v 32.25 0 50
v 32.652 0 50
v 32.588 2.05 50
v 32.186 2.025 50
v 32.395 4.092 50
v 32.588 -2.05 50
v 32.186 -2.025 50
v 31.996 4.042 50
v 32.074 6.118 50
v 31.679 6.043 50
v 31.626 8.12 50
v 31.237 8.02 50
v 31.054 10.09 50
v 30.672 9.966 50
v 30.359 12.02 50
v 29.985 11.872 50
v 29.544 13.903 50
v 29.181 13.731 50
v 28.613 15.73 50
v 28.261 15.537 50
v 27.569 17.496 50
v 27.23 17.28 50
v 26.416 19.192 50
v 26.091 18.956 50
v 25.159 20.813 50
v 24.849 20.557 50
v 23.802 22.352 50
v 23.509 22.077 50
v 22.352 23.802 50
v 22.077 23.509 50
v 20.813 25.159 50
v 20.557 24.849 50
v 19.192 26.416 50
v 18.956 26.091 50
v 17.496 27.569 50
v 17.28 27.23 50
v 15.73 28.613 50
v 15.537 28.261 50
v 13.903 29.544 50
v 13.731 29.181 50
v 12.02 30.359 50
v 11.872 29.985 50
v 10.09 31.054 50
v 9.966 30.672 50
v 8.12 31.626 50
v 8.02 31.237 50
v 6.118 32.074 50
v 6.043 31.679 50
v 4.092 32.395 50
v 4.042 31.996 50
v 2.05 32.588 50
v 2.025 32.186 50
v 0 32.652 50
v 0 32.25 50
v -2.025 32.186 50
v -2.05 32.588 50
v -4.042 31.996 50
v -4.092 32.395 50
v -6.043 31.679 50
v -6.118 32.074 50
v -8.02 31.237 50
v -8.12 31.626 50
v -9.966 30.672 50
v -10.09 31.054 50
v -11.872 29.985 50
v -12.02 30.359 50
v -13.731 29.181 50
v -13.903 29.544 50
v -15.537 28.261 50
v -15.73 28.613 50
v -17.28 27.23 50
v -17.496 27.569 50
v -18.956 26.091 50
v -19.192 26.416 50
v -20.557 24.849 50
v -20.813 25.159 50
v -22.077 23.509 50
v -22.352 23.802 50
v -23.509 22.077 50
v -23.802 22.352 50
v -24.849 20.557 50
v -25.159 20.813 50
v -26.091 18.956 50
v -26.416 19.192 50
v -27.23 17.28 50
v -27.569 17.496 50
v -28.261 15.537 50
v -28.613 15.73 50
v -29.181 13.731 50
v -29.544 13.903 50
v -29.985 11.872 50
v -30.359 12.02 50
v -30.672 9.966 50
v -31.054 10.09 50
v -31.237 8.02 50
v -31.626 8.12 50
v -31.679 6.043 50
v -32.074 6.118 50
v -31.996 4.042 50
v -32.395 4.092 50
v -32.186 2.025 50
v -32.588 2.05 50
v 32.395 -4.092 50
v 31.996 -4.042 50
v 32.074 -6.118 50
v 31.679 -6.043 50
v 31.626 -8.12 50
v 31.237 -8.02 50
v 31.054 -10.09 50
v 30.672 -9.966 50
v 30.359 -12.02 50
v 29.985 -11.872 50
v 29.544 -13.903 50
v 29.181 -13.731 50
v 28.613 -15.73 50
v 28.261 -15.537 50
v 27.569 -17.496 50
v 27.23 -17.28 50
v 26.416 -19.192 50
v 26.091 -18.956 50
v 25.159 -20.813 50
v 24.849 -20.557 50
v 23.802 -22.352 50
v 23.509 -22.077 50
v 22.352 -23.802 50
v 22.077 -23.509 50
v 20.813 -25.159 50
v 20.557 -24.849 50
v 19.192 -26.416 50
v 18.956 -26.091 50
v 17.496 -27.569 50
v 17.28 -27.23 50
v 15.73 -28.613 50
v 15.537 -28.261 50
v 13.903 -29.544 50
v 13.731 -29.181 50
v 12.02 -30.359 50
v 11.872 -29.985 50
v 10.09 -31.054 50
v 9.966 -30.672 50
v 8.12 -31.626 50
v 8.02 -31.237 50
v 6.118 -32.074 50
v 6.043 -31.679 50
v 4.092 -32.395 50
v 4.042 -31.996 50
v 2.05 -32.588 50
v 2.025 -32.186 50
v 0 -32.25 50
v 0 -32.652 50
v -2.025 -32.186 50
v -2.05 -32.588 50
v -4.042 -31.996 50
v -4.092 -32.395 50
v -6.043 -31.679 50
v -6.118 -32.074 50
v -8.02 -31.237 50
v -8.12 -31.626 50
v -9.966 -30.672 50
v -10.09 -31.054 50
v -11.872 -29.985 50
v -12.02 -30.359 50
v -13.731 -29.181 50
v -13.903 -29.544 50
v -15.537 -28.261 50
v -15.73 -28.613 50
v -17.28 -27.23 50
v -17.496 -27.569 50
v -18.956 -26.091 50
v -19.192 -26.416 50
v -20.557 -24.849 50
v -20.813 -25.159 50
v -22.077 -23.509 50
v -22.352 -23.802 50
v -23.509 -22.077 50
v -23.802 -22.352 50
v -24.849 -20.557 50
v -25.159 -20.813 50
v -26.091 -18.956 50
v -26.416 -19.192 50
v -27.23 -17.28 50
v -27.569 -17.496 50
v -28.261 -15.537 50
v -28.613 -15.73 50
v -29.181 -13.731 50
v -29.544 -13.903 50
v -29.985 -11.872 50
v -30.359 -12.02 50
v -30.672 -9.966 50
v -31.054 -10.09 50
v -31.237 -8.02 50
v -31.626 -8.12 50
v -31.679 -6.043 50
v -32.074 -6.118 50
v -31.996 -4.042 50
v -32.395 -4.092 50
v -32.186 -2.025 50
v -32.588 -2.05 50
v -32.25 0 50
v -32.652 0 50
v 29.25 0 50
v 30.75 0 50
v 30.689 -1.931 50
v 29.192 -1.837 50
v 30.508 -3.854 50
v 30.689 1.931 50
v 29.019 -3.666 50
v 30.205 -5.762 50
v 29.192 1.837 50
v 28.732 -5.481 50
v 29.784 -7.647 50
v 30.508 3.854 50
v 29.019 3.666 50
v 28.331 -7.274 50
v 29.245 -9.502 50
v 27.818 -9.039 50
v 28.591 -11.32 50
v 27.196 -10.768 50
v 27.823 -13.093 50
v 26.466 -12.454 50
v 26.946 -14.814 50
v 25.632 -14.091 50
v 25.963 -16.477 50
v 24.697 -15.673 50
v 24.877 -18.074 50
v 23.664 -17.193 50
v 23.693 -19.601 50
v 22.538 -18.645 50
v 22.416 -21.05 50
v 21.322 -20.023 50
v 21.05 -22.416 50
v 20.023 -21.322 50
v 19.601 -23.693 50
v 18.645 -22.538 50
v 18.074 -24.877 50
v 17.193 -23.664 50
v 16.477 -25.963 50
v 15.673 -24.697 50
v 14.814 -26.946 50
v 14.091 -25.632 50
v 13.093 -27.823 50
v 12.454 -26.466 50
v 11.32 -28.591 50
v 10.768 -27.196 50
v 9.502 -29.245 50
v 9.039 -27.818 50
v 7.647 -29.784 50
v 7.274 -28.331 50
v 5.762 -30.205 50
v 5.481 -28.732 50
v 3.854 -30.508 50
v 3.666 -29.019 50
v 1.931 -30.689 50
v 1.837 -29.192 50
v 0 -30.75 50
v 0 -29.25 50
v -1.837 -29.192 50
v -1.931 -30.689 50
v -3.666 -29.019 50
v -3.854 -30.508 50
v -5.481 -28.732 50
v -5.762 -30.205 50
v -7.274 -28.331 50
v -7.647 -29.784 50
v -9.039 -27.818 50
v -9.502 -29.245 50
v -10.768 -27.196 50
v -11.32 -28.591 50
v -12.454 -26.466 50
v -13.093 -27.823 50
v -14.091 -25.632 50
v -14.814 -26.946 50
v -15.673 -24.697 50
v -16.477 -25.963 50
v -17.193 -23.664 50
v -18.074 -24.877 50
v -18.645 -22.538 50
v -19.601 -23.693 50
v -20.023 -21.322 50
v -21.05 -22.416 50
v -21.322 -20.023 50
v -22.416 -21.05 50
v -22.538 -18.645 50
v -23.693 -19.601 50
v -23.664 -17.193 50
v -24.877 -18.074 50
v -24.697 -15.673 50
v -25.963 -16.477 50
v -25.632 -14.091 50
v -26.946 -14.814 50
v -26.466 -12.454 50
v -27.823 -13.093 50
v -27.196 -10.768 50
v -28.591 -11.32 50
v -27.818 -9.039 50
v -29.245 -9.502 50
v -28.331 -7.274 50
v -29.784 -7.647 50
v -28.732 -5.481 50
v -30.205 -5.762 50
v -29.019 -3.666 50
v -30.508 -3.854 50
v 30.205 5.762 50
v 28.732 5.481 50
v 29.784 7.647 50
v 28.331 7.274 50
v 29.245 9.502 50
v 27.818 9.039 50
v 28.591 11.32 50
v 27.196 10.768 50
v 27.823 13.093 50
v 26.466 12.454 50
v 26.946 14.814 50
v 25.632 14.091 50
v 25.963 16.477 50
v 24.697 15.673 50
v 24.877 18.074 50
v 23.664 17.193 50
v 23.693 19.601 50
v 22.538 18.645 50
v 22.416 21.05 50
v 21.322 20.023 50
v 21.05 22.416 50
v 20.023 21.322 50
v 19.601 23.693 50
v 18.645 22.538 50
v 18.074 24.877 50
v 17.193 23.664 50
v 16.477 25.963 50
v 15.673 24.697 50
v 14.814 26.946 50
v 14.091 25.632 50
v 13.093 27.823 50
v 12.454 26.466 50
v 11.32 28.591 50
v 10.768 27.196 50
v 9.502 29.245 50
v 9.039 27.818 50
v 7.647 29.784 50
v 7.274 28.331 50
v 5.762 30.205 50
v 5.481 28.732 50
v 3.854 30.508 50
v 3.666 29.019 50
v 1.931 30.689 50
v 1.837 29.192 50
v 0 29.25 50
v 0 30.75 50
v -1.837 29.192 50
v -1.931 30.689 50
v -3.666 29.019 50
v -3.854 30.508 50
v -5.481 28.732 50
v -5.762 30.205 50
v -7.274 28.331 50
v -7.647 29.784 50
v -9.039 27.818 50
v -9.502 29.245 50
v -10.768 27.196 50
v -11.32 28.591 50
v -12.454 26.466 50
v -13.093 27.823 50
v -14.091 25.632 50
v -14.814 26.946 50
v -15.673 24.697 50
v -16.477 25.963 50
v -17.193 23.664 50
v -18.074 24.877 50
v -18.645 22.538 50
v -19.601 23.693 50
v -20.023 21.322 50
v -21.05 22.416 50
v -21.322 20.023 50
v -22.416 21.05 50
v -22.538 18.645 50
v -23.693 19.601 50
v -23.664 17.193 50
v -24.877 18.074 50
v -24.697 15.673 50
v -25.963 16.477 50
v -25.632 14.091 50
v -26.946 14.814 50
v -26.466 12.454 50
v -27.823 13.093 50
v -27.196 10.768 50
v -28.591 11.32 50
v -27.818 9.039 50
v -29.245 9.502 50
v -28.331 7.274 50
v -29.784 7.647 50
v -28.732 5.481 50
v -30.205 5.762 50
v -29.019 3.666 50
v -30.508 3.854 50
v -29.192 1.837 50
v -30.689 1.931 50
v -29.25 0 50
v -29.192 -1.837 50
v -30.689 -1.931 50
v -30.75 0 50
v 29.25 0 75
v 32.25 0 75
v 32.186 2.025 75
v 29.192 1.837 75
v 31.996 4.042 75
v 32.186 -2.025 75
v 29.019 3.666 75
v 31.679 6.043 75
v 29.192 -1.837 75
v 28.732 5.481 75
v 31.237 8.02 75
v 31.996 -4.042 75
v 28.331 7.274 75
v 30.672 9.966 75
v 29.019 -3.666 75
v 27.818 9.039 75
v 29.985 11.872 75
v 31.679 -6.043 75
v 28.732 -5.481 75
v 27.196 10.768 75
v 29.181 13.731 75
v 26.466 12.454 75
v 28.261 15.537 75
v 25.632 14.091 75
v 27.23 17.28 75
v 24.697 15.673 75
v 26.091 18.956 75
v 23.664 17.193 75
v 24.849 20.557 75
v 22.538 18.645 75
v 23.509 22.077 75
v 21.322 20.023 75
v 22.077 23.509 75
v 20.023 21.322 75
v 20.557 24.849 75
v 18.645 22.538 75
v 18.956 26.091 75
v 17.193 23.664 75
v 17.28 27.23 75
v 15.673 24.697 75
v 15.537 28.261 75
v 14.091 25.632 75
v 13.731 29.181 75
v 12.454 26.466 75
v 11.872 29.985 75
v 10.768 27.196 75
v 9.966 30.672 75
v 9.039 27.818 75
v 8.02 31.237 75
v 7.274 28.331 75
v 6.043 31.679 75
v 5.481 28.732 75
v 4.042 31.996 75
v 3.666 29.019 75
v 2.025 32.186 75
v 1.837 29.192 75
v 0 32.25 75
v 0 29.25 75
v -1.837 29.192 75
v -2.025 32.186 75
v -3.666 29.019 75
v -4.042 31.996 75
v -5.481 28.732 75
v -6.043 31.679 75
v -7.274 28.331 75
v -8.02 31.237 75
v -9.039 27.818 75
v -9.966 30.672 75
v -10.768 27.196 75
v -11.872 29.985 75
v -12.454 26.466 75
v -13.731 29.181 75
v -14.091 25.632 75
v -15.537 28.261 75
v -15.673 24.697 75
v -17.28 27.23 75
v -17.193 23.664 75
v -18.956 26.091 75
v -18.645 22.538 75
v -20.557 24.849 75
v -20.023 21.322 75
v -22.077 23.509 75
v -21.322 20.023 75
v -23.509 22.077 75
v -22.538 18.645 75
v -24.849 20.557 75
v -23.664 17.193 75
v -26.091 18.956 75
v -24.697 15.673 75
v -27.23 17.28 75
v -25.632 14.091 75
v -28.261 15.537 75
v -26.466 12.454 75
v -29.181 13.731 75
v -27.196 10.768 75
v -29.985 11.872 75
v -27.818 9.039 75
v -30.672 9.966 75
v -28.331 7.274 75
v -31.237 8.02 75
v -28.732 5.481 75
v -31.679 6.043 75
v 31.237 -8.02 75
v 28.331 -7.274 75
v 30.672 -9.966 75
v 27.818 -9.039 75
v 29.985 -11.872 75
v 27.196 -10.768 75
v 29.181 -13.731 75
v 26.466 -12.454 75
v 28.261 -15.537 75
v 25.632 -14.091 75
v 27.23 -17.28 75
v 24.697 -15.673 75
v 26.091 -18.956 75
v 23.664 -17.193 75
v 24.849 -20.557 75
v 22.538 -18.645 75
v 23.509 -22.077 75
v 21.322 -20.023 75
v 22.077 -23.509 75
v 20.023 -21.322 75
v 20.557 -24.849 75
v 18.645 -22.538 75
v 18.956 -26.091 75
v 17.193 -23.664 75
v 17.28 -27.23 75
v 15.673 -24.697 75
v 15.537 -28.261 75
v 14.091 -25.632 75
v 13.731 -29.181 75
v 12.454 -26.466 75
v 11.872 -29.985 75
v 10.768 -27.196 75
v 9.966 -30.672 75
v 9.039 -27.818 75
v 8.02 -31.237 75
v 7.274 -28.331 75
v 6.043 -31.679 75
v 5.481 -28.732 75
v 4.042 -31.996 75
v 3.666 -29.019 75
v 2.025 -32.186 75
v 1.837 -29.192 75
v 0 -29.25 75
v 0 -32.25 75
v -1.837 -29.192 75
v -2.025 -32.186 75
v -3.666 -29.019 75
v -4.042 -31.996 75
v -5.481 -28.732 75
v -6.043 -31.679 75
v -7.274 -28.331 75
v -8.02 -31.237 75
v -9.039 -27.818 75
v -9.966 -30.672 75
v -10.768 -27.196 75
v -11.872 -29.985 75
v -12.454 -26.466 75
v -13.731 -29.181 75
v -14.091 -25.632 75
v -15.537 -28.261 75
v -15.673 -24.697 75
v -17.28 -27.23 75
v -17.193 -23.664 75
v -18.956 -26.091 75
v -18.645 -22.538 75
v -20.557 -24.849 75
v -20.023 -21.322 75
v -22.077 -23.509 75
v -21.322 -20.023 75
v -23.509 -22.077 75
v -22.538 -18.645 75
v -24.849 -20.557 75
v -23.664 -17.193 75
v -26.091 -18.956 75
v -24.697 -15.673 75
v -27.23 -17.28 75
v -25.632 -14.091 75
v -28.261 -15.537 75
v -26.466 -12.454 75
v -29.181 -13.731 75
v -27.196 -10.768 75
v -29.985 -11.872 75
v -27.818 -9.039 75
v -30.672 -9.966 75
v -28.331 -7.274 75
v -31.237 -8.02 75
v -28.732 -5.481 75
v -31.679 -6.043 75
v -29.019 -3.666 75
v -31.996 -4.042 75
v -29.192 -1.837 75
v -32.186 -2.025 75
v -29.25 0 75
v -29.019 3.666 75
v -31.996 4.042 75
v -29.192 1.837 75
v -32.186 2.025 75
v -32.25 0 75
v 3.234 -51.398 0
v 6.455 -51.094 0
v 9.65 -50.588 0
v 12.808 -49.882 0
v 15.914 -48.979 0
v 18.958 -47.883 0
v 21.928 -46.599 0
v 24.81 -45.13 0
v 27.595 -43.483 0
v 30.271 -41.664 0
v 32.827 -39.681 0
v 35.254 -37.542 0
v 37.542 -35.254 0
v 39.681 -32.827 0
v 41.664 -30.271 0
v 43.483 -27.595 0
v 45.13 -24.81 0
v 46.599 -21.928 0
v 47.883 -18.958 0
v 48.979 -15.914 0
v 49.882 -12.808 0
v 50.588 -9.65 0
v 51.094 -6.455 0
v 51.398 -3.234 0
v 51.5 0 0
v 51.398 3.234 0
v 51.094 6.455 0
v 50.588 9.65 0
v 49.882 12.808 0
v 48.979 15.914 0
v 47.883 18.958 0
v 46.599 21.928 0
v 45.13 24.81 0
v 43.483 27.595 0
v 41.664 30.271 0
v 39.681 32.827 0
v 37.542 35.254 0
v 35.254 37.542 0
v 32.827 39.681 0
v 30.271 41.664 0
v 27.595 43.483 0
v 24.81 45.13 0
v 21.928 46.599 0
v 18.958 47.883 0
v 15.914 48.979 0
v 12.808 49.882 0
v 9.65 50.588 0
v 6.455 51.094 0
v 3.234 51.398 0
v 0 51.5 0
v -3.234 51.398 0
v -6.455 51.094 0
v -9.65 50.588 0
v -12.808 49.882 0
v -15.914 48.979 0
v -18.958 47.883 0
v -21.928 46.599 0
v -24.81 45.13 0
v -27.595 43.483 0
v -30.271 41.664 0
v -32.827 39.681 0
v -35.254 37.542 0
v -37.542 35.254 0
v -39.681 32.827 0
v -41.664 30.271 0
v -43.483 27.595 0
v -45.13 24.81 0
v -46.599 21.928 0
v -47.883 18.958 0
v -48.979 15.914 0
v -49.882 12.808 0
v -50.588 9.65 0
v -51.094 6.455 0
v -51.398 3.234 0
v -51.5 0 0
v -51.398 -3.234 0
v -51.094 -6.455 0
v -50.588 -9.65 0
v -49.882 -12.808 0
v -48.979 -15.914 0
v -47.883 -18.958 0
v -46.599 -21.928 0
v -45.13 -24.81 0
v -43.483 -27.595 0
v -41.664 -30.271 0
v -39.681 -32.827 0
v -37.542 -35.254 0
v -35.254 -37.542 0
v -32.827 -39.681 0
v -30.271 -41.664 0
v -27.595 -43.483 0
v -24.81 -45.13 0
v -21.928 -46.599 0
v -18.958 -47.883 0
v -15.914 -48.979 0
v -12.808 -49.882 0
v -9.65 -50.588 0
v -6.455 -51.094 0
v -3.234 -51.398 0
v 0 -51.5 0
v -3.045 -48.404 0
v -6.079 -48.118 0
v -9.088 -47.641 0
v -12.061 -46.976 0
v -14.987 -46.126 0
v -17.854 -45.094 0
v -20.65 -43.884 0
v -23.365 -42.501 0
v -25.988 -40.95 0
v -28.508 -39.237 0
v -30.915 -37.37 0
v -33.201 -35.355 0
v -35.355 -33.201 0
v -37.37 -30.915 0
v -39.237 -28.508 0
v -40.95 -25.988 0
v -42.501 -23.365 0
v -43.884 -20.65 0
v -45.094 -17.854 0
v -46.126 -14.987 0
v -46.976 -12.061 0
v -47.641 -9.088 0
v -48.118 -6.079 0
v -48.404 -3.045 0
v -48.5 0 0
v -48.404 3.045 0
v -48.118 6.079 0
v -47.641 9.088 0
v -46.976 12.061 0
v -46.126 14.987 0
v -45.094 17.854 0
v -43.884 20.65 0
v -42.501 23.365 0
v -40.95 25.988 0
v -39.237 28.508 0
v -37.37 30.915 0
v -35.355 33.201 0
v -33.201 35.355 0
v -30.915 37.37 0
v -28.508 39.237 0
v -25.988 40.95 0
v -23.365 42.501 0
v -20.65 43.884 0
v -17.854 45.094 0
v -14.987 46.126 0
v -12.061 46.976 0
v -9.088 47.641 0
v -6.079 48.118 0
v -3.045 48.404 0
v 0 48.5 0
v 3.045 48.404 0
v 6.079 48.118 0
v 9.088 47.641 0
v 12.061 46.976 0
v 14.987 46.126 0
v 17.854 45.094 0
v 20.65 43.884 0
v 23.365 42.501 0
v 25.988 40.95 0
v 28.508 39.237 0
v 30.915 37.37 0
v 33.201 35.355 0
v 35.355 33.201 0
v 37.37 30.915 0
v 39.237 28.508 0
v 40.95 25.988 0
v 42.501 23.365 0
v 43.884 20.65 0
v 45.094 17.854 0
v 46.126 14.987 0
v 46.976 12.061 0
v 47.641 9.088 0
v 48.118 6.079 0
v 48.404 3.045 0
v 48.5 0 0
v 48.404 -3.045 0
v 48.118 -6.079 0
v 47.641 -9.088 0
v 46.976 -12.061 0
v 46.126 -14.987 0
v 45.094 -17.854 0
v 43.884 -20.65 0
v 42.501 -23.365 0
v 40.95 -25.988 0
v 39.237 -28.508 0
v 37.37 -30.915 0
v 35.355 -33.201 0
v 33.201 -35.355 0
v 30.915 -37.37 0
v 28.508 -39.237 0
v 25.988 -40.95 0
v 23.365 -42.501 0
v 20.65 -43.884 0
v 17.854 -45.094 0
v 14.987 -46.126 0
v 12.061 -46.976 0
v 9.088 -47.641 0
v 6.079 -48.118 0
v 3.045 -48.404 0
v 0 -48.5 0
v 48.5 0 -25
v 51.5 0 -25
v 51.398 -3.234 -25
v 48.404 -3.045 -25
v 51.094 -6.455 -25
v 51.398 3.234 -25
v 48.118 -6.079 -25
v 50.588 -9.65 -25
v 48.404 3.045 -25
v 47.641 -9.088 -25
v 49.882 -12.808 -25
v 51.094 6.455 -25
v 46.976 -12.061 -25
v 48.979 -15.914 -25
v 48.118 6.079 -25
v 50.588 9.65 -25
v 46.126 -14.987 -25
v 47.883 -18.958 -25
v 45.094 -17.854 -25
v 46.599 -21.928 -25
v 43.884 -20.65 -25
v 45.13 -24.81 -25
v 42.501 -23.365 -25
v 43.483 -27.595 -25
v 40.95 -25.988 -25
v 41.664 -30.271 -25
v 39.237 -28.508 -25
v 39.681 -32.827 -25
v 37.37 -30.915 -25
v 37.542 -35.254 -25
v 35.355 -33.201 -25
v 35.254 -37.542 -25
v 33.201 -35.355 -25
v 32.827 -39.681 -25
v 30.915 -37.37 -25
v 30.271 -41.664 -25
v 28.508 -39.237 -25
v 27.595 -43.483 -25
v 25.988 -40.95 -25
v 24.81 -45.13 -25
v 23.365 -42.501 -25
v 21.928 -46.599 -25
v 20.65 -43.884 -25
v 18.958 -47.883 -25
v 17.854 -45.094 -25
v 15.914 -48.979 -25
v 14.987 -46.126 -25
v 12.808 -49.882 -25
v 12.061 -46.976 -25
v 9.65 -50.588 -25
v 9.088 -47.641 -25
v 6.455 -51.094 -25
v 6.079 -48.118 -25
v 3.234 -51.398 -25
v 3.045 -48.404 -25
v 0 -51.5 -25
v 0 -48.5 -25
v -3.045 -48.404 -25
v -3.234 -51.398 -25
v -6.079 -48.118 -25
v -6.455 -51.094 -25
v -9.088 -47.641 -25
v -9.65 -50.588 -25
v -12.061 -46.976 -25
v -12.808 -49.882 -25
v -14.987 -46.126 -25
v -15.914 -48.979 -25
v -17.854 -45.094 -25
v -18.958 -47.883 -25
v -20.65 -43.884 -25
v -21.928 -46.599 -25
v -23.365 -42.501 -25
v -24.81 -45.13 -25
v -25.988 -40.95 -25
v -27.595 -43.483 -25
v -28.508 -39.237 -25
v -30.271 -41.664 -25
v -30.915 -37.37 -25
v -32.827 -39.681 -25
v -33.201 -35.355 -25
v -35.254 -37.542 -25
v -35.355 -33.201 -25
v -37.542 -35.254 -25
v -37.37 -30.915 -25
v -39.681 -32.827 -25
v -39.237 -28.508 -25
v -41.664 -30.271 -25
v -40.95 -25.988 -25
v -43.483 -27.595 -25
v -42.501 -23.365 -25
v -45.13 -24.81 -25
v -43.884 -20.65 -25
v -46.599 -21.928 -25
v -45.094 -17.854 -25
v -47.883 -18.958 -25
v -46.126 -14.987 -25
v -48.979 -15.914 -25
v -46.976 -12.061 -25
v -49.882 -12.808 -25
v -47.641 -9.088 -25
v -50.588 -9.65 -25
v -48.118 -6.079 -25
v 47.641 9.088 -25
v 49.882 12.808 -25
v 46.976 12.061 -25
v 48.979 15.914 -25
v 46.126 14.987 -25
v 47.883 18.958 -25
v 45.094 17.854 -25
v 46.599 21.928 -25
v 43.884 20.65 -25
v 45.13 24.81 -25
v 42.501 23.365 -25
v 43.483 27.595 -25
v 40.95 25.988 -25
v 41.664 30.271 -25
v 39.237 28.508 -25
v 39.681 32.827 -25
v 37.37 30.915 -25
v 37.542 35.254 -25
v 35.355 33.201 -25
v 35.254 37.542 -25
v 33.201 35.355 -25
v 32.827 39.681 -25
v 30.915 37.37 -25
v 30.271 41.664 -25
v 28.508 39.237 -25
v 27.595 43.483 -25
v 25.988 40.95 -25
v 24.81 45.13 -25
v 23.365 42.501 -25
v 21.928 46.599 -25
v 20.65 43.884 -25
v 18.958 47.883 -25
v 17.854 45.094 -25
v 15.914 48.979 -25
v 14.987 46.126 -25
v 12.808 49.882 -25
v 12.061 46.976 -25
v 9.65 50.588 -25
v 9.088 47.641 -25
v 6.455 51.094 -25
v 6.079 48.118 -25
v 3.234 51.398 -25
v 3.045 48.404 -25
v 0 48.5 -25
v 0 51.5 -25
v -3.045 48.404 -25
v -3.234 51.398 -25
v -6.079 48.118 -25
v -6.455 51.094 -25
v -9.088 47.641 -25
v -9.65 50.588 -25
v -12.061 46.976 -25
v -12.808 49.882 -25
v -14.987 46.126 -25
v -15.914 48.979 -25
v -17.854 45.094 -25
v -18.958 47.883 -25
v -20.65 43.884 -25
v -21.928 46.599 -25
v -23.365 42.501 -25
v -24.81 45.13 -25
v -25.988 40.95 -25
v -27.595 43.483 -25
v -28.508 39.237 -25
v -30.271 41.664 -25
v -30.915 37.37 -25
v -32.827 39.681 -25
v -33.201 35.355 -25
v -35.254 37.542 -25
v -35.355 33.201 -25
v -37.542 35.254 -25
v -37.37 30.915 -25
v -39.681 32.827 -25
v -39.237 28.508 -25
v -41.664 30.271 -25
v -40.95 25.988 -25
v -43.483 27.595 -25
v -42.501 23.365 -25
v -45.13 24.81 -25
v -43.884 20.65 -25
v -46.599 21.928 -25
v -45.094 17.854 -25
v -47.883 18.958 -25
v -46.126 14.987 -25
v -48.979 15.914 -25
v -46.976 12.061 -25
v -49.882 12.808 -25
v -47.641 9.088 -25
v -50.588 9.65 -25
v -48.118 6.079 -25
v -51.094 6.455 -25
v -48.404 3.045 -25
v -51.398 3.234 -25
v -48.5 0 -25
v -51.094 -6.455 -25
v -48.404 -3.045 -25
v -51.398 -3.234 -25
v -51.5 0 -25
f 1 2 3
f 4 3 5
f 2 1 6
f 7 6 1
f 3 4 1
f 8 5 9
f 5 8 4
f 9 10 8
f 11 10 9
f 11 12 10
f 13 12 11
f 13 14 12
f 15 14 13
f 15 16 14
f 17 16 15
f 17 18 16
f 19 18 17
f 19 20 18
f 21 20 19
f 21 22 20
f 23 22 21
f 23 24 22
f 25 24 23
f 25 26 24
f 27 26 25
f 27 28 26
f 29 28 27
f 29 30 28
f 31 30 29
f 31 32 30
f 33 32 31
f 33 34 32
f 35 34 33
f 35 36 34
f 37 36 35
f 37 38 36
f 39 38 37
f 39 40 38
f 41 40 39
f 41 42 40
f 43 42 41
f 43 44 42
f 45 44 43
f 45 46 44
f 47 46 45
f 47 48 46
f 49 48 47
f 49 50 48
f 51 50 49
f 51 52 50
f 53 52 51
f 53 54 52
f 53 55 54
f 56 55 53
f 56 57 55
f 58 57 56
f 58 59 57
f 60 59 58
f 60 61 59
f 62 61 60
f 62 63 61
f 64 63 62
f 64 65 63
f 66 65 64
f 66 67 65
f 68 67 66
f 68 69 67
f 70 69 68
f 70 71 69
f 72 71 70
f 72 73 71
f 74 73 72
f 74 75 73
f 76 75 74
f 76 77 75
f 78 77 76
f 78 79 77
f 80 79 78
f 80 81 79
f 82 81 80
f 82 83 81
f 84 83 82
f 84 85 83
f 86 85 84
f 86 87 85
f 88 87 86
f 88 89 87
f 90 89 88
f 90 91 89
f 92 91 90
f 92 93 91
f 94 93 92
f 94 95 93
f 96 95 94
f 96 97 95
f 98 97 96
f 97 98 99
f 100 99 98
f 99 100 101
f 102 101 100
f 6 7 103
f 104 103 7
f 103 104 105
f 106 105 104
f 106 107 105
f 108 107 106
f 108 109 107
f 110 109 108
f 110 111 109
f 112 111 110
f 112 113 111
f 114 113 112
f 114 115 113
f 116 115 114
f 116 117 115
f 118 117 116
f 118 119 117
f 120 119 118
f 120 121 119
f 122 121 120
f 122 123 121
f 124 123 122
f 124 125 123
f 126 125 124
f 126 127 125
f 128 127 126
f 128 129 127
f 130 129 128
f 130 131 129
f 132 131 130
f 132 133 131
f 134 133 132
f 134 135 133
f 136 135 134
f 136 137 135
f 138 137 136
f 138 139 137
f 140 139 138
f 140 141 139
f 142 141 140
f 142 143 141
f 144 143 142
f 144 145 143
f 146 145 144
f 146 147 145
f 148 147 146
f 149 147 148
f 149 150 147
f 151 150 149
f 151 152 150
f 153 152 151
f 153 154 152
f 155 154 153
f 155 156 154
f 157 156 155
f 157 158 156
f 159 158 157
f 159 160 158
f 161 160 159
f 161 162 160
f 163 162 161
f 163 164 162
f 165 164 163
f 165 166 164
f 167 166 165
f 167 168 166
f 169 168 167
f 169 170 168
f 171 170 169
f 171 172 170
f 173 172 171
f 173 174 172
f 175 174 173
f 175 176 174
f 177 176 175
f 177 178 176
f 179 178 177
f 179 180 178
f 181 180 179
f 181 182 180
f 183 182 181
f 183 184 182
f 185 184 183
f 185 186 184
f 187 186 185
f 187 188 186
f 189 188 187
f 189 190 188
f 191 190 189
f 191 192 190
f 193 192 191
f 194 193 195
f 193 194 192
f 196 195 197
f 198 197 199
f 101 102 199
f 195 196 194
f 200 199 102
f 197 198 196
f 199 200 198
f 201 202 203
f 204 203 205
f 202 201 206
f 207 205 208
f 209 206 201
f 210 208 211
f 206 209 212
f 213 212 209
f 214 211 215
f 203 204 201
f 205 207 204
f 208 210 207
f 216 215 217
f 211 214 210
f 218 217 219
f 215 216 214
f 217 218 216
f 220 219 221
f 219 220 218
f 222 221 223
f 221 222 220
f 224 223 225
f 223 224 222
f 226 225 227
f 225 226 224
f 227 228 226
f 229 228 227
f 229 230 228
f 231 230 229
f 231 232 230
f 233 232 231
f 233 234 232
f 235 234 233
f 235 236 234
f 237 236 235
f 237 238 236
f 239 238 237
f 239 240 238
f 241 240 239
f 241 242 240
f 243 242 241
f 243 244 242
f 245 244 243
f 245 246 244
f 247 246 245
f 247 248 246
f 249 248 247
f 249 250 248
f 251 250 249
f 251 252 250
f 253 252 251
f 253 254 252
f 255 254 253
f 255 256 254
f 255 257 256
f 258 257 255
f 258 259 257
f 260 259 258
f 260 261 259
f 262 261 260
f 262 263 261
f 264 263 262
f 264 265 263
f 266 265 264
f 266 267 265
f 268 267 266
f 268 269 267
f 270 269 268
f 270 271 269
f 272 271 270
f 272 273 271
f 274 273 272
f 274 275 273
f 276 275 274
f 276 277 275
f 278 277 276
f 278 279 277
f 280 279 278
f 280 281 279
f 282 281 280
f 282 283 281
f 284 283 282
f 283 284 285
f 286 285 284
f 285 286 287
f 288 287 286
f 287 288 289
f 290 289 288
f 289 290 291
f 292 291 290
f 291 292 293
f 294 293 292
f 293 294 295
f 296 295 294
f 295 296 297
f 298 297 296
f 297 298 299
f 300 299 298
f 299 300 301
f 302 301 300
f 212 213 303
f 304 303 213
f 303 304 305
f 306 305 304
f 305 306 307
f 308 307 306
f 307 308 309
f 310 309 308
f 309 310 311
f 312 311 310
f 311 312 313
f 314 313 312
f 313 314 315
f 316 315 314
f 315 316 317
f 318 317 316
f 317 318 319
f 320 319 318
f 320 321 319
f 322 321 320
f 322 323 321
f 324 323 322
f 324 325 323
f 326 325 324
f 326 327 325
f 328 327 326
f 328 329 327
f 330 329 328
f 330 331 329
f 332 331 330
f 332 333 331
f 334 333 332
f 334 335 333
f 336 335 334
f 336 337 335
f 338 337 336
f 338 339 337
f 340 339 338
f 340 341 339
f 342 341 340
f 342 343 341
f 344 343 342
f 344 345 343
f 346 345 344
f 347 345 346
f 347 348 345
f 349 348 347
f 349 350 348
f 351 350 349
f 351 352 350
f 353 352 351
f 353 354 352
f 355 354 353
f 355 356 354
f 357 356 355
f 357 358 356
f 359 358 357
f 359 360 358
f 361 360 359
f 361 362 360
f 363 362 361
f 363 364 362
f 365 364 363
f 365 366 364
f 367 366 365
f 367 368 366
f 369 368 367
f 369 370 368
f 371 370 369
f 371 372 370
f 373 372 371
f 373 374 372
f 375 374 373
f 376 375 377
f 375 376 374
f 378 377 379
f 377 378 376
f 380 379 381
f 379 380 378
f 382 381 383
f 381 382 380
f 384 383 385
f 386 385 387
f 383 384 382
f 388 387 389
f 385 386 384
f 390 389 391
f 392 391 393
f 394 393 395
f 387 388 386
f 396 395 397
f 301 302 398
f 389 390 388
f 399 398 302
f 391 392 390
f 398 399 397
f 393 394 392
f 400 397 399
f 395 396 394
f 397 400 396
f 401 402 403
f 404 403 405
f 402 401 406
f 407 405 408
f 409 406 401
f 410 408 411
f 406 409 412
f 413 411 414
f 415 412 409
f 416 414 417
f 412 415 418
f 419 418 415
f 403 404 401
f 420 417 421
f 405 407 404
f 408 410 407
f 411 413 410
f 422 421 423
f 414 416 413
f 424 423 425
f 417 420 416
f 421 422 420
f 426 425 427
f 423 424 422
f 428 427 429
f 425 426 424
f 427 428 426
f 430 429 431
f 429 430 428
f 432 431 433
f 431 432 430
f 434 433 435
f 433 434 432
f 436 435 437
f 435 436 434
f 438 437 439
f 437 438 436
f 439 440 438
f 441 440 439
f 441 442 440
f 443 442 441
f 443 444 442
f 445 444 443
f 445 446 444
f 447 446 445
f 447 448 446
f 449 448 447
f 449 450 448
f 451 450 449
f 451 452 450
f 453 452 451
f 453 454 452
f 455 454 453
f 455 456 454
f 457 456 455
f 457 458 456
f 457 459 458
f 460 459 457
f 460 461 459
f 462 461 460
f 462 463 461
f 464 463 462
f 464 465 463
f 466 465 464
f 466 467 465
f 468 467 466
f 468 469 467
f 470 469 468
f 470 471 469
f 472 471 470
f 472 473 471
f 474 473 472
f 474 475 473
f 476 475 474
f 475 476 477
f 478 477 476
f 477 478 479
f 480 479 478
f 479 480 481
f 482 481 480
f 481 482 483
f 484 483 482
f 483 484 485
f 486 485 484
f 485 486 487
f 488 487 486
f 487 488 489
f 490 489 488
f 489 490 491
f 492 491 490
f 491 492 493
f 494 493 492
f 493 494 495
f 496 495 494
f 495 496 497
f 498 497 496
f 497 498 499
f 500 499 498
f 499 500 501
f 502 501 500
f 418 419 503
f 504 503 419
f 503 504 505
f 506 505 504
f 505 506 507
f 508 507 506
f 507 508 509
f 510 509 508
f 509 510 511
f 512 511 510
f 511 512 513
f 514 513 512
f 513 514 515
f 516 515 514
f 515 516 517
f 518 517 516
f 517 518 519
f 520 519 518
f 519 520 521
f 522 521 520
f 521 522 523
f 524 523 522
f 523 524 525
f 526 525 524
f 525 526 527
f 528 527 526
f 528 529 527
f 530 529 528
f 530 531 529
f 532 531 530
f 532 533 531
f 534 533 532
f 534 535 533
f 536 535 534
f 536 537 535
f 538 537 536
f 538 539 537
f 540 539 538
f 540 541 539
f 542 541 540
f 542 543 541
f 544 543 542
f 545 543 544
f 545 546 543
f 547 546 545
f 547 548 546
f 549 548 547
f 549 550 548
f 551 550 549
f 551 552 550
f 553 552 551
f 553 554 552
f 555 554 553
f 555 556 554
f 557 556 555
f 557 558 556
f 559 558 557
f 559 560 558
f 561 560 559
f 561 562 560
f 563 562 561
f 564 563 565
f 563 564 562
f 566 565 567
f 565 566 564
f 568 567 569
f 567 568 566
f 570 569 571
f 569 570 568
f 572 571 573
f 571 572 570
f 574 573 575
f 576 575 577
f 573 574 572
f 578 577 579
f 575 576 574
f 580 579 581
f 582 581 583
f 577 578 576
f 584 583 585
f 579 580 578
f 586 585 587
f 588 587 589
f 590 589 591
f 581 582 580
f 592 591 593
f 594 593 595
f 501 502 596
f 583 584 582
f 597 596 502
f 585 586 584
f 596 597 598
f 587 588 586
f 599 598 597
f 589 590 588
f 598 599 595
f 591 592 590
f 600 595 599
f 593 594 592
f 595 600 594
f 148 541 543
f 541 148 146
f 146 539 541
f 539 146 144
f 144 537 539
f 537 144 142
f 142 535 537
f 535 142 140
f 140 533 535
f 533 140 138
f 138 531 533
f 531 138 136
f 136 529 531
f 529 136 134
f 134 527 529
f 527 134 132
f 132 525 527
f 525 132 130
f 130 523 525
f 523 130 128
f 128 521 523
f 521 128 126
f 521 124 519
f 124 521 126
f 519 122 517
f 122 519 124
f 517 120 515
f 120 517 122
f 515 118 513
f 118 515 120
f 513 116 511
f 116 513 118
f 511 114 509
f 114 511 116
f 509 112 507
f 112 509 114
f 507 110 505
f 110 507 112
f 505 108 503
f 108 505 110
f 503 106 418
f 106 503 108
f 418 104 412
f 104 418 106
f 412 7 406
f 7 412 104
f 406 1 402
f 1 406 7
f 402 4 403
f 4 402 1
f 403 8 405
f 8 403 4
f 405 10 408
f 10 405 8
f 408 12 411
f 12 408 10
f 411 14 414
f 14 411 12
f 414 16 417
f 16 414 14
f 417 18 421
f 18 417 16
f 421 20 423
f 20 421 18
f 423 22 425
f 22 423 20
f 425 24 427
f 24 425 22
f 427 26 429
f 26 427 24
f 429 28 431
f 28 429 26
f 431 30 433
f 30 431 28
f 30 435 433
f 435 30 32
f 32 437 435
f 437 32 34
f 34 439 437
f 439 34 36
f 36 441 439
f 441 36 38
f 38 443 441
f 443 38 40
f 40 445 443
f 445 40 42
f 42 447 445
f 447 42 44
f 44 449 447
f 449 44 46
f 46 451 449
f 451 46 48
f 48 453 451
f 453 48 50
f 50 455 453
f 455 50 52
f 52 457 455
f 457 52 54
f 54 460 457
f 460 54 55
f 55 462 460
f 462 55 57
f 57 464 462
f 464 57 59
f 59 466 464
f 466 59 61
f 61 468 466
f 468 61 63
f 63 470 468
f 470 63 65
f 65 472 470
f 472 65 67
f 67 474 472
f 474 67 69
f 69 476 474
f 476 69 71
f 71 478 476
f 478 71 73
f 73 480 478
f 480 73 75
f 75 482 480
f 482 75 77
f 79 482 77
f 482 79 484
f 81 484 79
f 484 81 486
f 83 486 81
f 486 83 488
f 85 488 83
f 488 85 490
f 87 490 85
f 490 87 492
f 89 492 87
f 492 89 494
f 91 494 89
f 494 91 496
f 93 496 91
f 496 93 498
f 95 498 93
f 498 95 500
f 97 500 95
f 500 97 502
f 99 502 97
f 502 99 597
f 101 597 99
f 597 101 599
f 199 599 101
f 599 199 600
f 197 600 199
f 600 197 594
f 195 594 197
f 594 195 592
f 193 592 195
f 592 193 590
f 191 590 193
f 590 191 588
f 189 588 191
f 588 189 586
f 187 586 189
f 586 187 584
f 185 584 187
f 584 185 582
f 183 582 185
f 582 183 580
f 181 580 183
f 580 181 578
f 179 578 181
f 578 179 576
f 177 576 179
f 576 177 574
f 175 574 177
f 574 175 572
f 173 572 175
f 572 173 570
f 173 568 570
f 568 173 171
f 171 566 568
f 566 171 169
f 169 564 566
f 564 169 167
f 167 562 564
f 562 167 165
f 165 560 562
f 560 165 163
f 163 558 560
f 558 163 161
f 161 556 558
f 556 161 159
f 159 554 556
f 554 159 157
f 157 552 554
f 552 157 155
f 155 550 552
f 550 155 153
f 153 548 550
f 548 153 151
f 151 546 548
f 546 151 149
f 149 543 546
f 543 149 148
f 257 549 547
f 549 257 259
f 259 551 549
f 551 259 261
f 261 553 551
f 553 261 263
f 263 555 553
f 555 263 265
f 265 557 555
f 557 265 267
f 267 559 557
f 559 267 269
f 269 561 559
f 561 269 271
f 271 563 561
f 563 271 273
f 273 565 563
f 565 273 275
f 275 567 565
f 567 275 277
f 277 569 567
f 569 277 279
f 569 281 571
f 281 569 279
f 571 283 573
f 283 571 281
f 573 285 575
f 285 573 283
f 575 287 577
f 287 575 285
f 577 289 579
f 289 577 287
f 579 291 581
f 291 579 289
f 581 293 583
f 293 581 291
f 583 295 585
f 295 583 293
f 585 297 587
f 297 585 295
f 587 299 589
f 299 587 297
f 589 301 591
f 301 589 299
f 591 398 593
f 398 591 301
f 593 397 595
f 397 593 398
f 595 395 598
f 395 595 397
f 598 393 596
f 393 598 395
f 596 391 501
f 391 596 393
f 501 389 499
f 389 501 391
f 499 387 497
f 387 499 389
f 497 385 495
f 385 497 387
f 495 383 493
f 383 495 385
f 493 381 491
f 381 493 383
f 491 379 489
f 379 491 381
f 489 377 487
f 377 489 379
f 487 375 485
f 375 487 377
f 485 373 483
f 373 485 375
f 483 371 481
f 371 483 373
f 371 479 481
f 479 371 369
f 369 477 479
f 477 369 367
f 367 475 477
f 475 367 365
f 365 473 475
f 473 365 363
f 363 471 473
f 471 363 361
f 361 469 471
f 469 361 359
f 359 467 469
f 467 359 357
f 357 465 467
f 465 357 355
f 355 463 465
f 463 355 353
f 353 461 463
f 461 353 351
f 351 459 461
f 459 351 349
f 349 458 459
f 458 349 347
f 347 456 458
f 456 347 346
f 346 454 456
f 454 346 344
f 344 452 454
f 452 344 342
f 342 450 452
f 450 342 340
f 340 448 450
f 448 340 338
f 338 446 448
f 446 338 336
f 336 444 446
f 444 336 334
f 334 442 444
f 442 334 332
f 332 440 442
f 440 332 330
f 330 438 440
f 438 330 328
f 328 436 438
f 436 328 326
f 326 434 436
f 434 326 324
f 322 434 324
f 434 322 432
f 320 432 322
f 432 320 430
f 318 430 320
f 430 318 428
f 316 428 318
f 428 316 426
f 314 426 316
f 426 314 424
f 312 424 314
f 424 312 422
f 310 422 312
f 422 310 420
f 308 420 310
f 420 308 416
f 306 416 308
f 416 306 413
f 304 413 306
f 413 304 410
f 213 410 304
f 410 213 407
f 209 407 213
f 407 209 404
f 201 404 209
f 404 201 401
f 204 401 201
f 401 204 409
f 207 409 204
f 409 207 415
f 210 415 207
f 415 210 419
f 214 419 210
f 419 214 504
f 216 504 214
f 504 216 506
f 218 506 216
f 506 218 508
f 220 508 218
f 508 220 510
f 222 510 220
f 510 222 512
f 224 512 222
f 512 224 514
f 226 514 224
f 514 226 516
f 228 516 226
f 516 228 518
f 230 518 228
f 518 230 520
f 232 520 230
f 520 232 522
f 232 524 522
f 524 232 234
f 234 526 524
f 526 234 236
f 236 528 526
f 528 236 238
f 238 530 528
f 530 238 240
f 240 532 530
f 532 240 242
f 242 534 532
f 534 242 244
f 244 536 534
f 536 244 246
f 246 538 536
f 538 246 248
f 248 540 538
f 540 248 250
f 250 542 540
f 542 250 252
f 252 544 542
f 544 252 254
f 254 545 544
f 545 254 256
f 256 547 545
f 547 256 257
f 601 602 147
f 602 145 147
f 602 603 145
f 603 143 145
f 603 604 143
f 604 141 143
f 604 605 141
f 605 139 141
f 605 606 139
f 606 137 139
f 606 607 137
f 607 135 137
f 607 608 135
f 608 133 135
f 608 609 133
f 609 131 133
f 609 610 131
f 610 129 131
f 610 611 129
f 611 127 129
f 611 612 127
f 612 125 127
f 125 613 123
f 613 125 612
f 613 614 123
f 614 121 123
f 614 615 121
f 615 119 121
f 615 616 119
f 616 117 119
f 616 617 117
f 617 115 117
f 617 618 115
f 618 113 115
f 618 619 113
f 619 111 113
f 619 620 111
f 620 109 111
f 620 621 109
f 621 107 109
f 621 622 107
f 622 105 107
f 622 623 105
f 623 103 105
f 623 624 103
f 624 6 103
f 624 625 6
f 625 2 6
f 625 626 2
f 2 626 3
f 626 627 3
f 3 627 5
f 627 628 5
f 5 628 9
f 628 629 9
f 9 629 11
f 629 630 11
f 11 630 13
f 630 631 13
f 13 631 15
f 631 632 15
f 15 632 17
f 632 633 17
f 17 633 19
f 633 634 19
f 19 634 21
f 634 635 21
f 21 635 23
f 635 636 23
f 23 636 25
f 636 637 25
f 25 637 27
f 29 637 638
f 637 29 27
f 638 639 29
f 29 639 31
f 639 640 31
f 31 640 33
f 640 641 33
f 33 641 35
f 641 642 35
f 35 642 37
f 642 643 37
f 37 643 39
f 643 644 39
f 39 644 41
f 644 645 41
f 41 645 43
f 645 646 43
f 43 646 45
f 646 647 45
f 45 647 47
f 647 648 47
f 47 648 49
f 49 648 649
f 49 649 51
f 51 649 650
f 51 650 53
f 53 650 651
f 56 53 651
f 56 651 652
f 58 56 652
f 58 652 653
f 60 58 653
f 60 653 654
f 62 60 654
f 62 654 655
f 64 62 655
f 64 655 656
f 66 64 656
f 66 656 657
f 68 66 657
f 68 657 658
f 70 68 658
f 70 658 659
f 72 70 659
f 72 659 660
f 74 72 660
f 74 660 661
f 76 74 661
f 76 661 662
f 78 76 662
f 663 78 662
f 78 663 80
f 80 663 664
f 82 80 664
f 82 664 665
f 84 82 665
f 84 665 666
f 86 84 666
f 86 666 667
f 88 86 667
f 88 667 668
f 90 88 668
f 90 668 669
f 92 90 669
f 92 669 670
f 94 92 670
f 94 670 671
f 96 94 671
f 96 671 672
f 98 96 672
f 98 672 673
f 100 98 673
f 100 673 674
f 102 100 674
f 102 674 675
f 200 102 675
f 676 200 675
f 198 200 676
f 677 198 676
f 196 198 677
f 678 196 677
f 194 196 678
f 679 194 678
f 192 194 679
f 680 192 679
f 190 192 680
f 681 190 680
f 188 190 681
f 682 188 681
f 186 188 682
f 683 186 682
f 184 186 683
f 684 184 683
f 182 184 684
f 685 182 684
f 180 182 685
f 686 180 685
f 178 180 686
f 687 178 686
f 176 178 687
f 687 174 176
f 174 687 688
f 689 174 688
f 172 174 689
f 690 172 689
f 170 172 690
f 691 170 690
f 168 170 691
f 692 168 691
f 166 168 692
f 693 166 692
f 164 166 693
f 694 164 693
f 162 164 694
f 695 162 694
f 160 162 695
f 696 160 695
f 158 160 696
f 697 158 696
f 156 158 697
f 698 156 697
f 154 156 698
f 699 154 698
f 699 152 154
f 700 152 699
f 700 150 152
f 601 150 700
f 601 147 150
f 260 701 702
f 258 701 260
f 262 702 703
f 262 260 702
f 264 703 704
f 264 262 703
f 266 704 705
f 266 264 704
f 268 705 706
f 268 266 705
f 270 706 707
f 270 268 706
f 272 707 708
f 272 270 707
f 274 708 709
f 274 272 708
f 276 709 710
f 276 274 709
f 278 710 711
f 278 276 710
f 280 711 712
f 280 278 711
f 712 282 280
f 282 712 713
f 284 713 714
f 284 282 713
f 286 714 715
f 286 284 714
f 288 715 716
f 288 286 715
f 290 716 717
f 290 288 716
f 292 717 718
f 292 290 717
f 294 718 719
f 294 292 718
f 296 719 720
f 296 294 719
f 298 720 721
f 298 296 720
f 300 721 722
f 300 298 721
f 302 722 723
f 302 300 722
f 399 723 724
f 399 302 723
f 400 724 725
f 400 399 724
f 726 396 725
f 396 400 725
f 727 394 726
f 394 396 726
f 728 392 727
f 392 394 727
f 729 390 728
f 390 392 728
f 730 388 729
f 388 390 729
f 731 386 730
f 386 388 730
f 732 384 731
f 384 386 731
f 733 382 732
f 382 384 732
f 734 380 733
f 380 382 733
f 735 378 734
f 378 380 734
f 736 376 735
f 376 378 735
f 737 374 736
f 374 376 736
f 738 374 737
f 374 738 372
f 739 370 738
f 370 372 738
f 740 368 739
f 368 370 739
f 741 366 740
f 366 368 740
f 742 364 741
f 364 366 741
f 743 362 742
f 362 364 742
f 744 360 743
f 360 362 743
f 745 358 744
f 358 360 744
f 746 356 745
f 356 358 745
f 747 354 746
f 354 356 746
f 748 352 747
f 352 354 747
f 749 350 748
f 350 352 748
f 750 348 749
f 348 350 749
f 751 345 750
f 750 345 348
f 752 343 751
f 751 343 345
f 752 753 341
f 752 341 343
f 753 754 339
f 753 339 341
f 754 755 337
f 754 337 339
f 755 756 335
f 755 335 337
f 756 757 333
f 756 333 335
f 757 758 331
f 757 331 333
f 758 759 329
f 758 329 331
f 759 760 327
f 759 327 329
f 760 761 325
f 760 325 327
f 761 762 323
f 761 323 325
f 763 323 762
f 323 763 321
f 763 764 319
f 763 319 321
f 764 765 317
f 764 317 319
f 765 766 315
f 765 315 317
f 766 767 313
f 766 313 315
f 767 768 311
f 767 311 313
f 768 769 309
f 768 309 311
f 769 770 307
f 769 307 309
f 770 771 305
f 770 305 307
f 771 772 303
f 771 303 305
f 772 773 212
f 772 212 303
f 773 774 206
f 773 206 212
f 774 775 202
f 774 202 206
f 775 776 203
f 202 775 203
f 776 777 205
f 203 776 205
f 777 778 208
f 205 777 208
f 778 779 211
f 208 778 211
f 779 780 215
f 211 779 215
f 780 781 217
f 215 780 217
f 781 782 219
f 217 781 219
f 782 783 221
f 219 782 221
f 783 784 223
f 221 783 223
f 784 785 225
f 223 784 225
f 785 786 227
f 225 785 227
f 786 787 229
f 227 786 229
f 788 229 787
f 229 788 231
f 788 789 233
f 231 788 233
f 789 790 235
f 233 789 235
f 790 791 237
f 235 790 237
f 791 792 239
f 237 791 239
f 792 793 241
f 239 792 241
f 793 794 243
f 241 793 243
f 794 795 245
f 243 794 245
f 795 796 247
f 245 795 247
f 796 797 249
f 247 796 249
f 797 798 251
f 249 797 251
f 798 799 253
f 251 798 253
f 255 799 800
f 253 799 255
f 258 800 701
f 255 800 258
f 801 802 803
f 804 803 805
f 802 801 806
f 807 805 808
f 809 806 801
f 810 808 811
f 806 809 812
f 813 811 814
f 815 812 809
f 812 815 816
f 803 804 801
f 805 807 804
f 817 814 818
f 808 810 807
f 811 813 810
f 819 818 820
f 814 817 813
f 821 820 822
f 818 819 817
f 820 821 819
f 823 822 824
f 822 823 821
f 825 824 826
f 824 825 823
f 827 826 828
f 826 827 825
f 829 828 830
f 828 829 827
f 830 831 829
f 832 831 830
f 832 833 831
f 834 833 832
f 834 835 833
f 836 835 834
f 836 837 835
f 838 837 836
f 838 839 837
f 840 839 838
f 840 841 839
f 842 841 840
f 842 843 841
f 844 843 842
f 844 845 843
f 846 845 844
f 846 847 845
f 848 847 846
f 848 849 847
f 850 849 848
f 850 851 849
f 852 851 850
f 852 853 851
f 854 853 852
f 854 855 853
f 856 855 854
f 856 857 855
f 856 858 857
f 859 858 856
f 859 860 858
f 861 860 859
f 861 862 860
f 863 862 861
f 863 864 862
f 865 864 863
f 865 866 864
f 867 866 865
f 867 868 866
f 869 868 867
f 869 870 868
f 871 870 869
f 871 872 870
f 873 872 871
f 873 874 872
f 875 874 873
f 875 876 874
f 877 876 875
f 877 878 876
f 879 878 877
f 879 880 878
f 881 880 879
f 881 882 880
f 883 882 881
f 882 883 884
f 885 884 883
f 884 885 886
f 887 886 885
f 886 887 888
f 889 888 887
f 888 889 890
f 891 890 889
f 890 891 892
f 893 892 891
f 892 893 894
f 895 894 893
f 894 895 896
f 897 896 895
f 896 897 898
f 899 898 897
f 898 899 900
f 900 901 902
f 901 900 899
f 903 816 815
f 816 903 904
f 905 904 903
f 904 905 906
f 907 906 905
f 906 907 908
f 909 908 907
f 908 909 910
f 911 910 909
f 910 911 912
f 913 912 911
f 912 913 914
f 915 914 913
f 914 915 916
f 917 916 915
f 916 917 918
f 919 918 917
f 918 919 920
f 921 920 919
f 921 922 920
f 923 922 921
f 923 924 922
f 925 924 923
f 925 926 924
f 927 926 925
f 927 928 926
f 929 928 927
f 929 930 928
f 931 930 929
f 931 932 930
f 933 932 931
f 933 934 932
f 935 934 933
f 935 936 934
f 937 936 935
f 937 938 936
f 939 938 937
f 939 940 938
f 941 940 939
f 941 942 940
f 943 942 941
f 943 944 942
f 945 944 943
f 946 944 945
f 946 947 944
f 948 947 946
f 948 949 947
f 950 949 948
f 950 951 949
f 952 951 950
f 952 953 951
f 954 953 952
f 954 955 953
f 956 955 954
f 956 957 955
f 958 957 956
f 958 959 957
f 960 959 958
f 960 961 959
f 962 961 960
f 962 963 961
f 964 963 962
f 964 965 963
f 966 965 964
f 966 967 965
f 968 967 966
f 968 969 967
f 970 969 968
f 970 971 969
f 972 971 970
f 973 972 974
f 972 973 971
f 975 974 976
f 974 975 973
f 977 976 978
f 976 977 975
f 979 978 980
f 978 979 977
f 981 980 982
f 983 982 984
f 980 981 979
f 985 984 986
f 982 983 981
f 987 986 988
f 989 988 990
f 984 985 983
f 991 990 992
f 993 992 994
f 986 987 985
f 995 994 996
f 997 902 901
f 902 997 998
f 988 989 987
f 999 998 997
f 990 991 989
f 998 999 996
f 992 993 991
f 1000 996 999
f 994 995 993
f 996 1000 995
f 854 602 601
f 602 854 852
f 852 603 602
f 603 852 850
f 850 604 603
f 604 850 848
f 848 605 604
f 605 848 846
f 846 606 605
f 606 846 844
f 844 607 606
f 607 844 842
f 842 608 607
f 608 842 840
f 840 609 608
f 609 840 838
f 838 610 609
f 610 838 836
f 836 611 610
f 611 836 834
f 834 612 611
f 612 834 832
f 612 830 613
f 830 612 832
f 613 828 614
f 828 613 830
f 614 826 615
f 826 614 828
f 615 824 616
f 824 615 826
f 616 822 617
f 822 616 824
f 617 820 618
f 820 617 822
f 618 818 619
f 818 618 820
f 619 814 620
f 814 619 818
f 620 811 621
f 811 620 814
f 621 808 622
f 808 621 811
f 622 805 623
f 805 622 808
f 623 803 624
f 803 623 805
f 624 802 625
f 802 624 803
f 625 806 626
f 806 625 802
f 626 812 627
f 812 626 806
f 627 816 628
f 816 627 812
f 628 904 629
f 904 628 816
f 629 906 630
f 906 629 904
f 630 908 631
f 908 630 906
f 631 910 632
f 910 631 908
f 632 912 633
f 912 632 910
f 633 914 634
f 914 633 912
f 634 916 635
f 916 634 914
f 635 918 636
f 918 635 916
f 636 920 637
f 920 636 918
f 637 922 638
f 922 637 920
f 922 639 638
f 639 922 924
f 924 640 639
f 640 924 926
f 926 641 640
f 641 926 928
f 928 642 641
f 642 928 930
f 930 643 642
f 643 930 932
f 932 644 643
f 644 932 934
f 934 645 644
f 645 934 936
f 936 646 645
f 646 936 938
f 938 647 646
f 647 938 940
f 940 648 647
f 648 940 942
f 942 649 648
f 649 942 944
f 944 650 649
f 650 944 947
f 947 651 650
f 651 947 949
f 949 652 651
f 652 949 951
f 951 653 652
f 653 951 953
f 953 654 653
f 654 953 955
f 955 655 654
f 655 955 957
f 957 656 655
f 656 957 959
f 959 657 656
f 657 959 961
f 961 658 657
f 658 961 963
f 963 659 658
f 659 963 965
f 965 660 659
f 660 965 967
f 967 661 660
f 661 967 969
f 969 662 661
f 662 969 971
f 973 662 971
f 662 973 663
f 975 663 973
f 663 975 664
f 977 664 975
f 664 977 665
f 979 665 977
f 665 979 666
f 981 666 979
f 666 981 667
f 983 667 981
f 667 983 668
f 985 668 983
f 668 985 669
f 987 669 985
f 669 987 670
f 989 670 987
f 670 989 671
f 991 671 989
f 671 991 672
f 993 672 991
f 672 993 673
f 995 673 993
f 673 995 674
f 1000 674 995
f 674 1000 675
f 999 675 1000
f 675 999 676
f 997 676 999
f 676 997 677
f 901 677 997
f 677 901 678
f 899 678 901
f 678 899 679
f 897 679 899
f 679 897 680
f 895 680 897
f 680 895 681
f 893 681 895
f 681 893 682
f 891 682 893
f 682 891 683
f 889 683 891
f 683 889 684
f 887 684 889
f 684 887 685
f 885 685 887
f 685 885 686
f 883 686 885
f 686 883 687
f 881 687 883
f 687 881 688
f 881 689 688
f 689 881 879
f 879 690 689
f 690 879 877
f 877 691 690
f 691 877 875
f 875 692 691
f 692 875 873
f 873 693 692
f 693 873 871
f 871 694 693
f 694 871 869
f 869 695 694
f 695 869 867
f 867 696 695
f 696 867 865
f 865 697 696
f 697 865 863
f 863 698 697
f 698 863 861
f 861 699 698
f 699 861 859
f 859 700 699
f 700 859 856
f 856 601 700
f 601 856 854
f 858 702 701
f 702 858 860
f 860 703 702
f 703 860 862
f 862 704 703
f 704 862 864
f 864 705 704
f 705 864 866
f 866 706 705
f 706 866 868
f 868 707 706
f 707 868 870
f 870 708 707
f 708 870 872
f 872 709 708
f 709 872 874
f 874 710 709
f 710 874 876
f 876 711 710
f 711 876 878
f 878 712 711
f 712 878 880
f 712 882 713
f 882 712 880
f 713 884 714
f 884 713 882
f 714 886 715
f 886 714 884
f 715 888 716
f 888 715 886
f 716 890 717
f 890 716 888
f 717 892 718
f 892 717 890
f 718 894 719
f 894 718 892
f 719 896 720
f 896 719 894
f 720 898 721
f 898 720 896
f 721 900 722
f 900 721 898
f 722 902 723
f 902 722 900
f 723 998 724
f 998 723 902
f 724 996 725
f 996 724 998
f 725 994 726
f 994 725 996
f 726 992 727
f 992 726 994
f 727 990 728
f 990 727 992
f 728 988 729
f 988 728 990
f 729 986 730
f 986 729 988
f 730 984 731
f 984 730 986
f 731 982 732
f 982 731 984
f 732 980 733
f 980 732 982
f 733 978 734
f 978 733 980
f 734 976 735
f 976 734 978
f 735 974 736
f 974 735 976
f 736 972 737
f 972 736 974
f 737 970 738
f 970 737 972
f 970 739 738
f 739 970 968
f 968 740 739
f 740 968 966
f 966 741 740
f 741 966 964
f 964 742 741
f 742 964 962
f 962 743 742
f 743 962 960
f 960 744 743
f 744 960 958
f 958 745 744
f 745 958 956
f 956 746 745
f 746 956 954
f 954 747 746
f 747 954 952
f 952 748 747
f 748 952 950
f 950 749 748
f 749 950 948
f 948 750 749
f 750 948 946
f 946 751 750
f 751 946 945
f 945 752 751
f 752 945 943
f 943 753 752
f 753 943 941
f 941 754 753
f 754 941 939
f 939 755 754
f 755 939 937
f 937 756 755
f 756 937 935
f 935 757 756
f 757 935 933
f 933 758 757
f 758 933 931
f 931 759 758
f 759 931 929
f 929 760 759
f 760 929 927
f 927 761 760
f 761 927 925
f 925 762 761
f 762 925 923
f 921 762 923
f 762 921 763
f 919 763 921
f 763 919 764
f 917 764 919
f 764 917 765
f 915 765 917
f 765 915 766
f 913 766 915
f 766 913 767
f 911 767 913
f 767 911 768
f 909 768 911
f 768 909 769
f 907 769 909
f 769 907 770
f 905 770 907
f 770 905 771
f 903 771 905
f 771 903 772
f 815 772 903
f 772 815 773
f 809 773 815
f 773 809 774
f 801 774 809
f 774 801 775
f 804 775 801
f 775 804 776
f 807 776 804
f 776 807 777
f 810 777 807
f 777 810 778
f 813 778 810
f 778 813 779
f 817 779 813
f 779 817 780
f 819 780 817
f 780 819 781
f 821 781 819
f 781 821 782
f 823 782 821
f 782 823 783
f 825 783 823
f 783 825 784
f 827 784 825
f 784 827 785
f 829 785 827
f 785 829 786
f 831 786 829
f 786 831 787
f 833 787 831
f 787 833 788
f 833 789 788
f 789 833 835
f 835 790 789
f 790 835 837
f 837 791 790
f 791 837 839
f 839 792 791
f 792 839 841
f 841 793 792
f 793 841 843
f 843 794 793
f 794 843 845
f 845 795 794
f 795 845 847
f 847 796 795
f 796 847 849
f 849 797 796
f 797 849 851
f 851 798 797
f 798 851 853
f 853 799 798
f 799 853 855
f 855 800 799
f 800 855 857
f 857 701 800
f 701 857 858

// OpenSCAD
a = 58.5 / 2; // diameter of a
c = 97 / 2;   // diameter of c
ah = 25;      // height of a
bh = 50;      // height of b
ch = 25;      // height of c
t = 3;        // wall thickness

// a
translate([0, 0, bh]) {
    linear_extrude(height = ah, $fn = 100) {
        difference() {
            circle(a + t);
            circle(a);
        }
    }
}

// a -> b
linear_extrude(height = bh, scale = (a + t / 2) / c, $fn = 100) {
    difference() {
        circle(c + t);
        circle(c);
    }
}

// b
translate([0, 0, -ch]) {
    linear_extrude(height = ch, $fn = 100) {
        difference() {
            circle(c + t);
            circle(c);
        }
    }
}
